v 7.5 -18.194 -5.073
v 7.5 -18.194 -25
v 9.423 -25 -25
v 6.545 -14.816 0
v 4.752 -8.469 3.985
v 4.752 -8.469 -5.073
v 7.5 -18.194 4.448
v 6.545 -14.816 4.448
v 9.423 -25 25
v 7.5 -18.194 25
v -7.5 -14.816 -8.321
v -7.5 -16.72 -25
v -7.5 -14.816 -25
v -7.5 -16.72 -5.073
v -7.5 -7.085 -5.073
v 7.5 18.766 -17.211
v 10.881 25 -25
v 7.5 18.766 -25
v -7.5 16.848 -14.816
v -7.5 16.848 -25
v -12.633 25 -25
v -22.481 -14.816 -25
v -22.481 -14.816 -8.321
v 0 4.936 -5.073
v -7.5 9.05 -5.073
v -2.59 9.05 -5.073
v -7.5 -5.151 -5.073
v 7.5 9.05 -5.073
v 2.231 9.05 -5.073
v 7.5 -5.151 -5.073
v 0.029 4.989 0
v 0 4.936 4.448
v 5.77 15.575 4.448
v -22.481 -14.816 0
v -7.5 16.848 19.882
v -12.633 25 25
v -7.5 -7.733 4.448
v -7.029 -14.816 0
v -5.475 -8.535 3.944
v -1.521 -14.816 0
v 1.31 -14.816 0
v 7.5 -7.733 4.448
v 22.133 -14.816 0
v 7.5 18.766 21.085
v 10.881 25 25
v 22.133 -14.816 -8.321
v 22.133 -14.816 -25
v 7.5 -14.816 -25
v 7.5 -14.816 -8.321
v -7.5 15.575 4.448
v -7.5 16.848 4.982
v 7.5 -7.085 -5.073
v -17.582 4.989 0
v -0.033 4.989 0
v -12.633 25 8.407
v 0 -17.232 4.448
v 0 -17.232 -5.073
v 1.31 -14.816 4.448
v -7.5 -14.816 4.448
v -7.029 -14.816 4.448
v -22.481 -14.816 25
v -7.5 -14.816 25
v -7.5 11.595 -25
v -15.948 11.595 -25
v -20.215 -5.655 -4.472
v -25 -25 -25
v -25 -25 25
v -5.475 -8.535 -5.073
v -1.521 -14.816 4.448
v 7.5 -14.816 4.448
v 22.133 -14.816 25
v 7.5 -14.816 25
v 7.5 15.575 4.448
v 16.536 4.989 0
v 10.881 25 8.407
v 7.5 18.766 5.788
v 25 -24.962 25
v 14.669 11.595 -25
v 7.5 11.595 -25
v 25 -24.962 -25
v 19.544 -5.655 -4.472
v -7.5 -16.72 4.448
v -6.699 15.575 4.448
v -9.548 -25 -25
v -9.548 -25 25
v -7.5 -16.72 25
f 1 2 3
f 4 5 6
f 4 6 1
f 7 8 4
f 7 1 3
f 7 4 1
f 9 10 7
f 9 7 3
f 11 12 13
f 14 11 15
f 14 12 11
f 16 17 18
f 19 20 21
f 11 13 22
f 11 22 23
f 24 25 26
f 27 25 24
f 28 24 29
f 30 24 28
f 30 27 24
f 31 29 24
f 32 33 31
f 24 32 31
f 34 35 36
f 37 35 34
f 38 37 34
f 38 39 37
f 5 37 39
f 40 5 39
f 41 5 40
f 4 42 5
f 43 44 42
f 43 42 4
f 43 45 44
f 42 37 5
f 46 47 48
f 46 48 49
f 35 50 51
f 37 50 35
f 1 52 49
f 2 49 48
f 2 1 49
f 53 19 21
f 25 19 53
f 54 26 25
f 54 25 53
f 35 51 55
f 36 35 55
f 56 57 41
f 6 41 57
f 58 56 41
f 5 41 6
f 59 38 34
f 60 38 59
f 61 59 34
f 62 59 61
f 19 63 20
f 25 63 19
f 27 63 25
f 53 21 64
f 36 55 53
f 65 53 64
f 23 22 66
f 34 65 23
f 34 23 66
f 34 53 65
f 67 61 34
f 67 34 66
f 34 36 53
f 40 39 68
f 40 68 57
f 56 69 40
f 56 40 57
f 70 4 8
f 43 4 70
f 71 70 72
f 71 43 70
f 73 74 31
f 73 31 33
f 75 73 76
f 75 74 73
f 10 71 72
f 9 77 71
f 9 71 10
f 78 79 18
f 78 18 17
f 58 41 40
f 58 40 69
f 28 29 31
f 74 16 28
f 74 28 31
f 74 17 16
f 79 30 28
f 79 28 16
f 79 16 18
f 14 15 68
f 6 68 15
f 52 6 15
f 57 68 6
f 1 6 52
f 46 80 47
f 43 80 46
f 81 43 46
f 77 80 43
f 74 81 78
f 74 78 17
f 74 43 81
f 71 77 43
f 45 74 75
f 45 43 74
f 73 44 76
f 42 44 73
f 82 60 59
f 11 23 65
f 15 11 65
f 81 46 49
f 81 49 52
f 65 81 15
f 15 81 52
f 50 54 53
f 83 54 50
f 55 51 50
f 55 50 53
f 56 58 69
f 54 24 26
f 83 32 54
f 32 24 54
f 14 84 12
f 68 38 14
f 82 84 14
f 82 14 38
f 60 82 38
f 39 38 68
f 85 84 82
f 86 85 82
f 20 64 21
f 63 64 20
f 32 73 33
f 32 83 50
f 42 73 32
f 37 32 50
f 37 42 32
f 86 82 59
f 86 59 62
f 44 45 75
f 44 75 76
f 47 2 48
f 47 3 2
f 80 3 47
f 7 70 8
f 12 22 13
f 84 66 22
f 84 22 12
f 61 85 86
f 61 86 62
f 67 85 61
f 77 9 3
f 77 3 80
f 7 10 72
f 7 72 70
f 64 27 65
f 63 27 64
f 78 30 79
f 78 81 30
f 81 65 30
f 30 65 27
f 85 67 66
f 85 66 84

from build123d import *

# Parameters (mm, degrees)
F3_DEPTH = 25
F4_DEPTH = 25
F5_DEPTH = 25


with BuildPart() as f3:
    # F0 (on Front) → F3 (new body, symmetric)
    with BuildSketch(Plane.XZ):
        Polygon((-7.5, 25), (-25, 25), (-25, 10.391577), (-25, -13.939915), (-25, -25), (-7.5, -25), (-7.5, -5.072788), (7.5, -5.072788), (7.5, -25), (25, -25), (25, -13.939915), (25, 10.391577), (25, 25), (7.5, 25), (7.5, 4.447581), (-7.5, 4.447581), align=None)
    extrude(amount=F3_DEPTH, both=True)

    # F2 (on Right) → F4 (intersect, symmetric)
    with BuildSketch(Plane.YZ):
        Polygon((-25, -25), (-14.815953, -25), (-14.815953, -8.320933), (-5.655421, -4.472235), (11.595094, -25), (25, -25), (4.989232, 0), (25, 8.407306), (25, 25), (-14.815953, 0), (-14.815953, 25), (-25, 25), align=None)
    extrude(amount=F4_DEPTH, both=True, mode=Mode.INTERSECT)

    # F1 (on Top) → F5 (intersect, symmetric)
    with BuildSketch(Plane.XY):
        Polygon((-12.632664, 25), (-25, -25), (-9.547958, -25), (-5.475463, -8.535276), (0, -17.231597), (4.751956, -8.469481), (9.423391, -25), (25, -24.961657), (10.881108, 25), (0, 4.936364), align=None)
    extrude(amount=F5_DEPTH, both=True, mode=Mode.INTERSECT)


solid = f3.part
